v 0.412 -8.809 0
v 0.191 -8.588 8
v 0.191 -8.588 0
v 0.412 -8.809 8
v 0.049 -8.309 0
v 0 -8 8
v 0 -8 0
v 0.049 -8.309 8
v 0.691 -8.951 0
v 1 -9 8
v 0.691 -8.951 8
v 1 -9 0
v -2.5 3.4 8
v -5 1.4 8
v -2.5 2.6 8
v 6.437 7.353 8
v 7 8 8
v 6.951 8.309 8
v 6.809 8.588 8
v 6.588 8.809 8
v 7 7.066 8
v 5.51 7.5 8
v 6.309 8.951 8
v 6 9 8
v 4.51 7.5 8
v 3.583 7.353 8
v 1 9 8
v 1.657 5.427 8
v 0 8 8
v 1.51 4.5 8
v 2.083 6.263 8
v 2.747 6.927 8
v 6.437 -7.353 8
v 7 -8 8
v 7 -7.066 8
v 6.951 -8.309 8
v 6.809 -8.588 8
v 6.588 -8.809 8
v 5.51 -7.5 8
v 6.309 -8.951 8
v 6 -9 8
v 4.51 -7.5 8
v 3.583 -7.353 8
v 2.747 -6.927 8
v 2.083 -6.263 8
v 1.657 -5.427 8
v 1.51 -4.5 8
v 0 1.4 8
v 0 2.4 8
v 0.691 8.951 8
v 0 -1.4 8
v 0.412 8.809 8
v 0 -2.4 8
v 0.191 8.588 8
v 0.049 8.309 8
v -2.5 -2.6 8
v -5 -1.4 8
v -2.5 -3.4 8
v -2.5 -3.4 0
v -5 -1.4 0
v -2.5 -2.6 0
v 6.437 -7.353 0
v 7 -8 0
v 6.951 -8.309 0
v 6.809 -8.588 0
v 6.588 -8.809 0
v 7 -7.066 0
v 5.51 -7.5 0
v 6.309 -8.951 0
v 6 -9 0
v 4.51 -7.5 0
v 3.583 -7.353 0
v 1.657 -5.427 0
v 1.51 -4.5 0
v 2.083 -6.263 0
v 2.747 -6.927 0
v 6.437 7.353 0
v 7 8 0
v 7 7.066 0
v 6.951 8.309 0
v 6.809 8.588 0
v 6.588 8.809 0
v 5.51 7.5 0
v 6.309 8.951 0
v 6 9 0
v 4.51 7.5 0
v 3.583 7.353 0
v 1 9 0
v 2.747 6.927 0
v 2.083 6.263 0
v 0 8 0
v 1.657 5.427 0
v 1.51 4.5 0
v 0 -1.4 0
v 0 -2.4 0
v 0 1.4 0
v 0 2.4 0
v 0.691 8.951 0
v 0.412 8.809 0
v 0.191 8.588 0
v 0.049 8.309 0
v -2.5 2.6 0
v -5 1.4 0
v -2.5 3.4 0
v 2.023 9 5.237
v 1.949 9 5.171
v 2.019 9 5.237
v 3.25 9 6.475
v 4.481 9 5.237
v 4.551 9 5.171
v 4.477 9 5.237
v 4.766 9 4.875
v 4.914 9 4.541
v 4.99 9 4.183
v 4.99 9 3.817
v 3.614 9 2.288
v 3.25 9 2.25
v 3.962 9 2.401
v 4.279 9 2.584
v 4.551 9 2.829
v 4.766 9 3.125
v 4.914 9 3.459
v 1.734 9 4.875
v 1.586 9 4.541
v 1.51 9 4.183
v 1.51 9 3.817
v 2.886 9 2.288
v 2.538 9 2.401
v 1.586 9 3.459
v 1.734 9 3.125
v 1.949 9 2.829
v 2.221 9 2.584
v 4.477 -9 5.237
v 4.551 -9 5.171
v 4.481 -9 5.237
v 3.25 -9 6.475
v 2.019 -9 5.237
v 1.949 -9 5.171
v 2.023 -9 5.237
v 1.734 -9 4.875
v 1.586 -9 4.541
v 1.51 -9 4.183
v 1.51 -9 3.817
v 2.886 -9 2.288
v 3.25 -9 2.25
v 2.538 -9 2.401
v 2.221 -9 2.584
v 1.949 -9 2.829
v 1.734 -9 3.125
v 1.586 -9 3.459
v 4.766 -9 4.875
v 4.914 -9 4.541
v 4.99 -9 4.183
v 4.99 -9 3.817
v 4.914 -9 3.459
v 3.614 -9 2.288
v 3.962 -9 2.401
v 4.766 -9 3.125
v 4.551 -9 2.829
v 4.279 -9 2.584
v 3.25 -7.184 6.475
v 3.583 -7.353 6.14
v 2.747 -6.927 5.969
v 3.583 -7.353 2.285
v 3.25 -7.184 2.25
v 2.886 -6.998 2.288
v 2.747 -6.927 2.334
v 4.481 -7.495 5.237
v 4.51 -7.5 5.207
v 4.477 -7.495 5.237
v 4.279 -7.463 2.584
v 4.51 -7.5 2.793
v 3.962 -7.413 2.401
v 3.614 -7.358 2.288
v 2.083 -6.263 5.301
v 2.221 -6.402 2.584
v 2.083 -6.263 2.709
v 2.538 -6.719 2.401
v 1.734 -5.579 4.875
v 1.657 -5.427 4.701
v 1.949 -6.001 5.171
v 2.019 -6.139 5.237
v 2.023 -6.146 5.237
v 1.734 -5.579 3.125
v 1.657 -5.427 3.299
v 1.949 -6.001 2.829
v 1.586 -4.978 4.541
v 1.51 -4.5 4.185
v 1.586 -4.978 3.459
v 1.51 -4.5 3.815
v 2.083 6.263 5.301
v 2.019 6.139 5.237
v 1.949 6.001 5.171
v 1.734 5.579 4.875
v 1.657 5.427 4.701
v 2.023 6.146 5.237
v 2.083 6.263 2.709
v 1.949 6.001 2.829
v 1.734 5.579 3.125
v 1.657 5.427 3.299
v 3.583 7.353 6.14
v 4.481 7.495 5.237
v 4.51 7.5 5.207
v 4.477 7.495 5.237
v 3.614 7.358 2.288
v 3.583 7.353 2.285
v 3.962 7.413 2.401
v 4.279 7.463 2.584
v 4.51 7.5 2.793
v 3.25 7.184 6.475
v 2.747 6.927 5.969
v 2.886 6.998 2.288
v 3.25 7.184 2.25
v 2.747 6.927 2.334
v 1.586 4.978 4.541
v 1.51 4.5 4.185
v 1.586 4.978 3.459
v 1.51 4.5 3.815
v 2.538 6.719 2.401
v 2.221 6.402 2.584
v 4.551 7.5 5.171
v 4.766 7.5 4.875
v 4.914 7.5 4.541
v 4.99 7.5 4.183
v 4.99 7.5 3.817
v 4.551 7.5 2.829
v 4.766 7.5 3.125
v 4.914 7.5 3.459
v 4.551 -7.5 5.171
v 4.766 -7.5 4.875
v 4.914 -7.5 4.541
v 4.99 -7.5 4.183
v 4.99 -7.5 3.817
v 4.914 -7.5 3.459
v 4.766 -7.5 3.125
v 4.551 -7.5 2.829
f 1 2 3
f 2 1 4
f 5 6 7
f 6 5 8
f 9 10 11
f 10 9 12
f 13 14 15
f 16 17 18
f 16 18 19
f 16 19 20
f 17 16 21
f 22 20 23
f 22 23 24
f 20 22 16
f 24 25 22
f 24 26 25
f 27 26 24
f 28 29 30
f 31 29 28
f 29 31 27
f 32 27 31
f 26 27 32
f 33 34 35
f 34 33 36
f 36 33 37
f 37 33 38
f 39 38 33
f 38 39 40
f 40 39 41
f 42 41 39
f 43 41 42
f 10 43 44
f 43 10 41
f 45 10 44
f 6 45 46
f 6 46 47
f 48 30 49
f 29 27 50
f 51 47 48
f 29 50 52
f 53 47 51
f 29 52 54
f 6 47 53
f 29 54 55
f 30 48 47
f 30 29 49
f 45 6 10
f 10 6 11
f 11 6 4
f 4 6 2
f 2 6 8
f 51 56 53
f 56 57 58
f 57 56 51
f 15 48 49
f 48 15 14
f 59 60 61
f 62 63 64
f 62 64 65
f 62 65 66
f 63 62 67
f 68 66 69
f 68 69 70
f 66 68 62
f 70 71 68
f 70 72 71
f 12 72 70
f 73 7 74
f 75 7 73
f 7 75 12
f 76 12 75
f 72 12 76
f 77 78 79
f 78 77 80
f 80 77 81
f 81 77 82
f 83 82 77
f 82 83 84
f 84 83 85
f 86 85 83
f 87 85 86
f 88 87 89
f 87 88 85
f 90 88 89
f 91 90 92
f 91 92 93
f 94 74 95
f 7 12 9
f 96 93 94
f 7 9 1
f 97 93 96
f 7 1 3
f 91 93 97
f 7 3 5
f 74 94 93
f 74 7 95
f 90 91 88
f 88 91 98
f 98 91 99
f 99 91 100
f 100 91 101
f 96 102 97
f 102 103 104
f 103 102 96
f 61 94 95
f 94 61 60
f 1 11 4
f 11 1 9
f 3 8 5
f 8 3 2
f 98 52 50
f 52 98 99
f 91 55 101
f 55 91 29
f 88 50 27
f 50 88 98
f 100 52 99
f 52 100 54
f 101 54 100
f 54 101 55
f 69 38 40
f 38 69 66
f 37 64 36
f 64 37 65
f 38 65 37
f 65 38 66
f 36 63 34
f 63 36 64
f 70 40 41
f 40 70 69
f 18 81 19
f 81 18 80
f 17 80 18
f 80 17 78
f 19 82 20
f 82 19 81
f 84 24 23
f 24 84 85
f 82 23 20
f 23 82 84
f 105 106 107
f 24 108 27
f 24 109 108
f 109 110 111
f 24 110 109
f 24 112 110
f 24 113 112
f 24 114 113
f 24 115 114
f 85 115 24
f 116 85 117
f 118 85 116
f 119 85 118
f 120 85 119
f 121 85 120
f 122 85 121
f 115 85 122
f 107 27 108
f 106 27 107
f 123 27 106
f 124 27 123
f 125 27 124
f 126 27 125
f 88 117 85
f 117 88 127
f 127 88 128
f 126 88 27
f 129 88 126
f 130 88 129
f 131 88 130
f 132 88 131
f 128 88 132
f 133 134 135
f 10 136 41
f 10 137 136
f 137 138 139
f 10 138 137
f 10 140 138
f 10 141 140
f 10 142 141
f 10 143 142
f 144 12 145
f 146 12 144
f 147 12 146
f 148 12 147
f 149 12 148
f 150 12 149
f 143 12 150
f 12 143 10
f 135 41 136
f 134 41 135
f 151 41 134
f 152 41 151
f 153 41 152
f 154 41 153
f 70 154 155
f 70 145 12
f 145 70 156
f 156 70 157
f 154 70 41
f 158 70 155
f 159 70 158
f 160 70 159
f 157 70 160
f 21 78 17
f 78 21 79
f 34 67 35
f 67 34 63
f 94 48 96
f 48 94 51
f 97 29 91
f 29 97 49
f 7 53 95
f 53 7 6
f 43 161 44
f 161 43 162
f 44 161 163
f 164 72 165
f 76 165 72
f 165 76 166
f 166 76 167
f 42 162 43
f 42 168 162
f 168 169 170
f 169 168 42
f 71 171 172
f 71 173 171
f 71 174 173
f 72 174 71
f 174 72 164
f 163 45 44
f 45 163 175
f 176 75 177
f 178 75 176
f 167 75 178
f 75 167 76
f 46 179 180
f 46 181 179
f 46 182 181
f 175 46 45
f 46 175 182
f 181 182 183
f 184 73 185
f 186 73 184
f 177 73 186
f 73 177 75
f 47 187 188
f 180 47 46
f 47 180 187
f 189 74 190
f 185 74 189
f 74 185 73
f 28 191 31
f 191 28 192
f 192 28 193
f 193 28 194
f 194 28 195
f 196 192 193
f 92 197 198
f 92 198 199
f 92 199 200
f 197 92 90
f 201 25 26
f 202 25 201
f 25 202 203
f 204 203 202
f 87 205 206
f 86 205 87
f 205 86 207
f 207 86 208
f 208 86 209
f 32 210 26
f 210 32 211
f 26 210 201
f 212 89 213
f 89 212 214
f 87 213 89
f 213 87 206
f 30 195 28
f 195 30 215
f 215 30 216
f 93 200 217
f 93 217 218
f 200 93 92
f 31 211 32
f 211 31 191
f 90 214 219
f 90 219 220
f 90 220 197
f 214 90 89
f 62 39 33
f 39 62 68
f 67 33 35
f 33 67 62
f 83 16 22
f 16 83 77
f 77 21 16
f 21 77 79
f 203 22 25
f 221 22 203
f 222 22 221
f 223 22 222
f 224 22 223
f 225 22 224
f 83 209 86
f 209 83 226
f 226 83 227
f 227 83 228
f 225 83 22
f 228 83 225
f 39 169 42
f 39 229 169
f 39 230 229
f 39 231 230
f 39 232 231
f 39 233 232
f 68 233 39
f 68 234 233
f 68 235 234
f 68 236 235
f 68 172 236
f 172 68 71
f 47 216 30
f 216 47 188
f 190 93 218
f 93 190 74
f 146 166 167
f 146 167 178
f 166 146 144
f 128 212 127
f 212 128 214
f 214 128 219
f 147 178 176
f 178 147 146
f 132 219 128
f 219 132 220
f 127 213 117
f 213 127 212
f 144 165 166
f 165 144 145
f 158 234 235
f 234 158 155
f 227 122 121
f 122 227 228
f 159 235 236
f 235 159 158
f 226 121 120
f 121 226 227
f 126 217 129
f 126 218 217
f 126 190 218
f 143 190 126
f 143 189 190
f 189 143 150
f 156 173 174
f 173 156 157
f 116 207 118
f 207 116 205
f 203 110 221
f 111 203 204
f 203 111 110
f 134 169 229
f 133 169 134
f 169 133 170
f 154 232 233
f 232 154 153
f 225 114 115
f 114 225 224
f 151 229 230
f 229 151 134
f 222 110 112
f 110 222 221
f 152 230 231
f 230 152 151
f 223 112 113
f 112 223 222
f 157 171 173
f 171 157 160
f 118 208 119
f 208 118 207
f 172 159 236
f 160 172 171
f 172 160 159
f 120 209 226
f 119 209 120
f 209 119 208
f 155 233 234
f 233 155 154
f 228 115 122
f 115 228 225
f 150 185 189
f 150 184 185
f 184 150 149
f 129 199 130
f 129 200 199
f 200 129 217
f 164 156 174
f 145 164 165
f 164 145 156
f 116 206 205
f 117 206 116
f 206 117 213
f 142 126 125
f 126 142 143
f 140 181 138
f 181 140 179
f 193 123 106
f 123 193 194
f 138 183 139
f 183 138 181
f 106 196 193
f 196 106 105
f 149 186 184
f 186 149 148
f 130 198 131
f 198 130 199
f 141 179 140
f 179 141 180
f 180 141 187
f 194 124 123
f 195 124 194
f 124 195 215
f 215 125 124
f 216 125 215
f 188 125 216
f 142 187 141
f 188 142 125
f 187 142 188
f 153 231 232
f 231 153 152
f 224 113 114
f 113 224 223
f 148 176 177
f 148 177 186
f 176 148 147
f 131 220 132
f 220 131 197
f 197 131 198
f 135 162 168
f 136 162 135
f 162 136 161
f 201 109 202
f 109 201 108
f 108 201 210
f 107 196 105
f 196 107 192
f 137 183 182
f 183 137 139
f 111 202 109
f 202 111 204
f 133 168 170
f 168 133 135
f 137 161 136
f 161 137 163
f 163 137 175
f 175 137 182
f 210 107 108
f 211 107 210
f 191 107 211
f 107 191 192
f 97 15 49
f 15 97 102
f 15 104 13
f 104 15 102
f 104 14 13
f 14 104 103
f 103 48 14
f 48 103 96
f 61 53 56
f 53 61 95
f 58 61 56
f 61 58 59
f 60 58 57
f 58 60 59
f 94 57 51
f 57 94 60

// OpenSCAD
$fn=20;
include <MCAD/boxes.scad>;
include <MCAD/teardrop.scad>;

//CUSTOMIZER VARIABLES

//	Parameters
//	Height of the clip
Height= 8; 		//	[6:50]
// width of the slot
Distance_Slot=4.8; 	//	[3:10]
// hole for tie rip Diameter
dHole= 3.5; 		//	[3:10]
// width of extrusion beam
width= 18; 		//	[13:40]
// depth outside
deep=7;
// thickness of wall (1/10 of mm)
wall=15;		// 	[5:50]
//CUSTOMIZER VARIABLES END


module Hook(h=5){
	linear_extrude(height=h)
		polygon([[0,0],[-2.5,0.2],[-2.5,1],[-5,-1],[0,-1],[0,0]]);
	}


wall2= wall / 10;
echo("Size inside:", deep - wall2,"x", width-2*wall2, "mm");
	
translate([0, Distance_Slot/2, 0]) 	rotate([0,0,0])	  Hook(h=Height);
translate([0,-Distance_Slot/2, Height]) rotate([180,0,0]) Hook(h=Height);

difference(){
	translate([deep/2, 0, Height/2]) 
		roundedBox([deep,width,Height], 1, true);
	translate([(deep)/2+wall2+0.01, 0, Height/2]) 
		roundedBox([deep,width-2*wall2,Height+1], 3, true);	
	
translate([dHole/2+wall2, 0, Height/2])
rotate([0,0,90])		
//	cylinder(d=dHole, h=width+1, center=true);
	teardrop(dHole/2, width+1, 90);
}
